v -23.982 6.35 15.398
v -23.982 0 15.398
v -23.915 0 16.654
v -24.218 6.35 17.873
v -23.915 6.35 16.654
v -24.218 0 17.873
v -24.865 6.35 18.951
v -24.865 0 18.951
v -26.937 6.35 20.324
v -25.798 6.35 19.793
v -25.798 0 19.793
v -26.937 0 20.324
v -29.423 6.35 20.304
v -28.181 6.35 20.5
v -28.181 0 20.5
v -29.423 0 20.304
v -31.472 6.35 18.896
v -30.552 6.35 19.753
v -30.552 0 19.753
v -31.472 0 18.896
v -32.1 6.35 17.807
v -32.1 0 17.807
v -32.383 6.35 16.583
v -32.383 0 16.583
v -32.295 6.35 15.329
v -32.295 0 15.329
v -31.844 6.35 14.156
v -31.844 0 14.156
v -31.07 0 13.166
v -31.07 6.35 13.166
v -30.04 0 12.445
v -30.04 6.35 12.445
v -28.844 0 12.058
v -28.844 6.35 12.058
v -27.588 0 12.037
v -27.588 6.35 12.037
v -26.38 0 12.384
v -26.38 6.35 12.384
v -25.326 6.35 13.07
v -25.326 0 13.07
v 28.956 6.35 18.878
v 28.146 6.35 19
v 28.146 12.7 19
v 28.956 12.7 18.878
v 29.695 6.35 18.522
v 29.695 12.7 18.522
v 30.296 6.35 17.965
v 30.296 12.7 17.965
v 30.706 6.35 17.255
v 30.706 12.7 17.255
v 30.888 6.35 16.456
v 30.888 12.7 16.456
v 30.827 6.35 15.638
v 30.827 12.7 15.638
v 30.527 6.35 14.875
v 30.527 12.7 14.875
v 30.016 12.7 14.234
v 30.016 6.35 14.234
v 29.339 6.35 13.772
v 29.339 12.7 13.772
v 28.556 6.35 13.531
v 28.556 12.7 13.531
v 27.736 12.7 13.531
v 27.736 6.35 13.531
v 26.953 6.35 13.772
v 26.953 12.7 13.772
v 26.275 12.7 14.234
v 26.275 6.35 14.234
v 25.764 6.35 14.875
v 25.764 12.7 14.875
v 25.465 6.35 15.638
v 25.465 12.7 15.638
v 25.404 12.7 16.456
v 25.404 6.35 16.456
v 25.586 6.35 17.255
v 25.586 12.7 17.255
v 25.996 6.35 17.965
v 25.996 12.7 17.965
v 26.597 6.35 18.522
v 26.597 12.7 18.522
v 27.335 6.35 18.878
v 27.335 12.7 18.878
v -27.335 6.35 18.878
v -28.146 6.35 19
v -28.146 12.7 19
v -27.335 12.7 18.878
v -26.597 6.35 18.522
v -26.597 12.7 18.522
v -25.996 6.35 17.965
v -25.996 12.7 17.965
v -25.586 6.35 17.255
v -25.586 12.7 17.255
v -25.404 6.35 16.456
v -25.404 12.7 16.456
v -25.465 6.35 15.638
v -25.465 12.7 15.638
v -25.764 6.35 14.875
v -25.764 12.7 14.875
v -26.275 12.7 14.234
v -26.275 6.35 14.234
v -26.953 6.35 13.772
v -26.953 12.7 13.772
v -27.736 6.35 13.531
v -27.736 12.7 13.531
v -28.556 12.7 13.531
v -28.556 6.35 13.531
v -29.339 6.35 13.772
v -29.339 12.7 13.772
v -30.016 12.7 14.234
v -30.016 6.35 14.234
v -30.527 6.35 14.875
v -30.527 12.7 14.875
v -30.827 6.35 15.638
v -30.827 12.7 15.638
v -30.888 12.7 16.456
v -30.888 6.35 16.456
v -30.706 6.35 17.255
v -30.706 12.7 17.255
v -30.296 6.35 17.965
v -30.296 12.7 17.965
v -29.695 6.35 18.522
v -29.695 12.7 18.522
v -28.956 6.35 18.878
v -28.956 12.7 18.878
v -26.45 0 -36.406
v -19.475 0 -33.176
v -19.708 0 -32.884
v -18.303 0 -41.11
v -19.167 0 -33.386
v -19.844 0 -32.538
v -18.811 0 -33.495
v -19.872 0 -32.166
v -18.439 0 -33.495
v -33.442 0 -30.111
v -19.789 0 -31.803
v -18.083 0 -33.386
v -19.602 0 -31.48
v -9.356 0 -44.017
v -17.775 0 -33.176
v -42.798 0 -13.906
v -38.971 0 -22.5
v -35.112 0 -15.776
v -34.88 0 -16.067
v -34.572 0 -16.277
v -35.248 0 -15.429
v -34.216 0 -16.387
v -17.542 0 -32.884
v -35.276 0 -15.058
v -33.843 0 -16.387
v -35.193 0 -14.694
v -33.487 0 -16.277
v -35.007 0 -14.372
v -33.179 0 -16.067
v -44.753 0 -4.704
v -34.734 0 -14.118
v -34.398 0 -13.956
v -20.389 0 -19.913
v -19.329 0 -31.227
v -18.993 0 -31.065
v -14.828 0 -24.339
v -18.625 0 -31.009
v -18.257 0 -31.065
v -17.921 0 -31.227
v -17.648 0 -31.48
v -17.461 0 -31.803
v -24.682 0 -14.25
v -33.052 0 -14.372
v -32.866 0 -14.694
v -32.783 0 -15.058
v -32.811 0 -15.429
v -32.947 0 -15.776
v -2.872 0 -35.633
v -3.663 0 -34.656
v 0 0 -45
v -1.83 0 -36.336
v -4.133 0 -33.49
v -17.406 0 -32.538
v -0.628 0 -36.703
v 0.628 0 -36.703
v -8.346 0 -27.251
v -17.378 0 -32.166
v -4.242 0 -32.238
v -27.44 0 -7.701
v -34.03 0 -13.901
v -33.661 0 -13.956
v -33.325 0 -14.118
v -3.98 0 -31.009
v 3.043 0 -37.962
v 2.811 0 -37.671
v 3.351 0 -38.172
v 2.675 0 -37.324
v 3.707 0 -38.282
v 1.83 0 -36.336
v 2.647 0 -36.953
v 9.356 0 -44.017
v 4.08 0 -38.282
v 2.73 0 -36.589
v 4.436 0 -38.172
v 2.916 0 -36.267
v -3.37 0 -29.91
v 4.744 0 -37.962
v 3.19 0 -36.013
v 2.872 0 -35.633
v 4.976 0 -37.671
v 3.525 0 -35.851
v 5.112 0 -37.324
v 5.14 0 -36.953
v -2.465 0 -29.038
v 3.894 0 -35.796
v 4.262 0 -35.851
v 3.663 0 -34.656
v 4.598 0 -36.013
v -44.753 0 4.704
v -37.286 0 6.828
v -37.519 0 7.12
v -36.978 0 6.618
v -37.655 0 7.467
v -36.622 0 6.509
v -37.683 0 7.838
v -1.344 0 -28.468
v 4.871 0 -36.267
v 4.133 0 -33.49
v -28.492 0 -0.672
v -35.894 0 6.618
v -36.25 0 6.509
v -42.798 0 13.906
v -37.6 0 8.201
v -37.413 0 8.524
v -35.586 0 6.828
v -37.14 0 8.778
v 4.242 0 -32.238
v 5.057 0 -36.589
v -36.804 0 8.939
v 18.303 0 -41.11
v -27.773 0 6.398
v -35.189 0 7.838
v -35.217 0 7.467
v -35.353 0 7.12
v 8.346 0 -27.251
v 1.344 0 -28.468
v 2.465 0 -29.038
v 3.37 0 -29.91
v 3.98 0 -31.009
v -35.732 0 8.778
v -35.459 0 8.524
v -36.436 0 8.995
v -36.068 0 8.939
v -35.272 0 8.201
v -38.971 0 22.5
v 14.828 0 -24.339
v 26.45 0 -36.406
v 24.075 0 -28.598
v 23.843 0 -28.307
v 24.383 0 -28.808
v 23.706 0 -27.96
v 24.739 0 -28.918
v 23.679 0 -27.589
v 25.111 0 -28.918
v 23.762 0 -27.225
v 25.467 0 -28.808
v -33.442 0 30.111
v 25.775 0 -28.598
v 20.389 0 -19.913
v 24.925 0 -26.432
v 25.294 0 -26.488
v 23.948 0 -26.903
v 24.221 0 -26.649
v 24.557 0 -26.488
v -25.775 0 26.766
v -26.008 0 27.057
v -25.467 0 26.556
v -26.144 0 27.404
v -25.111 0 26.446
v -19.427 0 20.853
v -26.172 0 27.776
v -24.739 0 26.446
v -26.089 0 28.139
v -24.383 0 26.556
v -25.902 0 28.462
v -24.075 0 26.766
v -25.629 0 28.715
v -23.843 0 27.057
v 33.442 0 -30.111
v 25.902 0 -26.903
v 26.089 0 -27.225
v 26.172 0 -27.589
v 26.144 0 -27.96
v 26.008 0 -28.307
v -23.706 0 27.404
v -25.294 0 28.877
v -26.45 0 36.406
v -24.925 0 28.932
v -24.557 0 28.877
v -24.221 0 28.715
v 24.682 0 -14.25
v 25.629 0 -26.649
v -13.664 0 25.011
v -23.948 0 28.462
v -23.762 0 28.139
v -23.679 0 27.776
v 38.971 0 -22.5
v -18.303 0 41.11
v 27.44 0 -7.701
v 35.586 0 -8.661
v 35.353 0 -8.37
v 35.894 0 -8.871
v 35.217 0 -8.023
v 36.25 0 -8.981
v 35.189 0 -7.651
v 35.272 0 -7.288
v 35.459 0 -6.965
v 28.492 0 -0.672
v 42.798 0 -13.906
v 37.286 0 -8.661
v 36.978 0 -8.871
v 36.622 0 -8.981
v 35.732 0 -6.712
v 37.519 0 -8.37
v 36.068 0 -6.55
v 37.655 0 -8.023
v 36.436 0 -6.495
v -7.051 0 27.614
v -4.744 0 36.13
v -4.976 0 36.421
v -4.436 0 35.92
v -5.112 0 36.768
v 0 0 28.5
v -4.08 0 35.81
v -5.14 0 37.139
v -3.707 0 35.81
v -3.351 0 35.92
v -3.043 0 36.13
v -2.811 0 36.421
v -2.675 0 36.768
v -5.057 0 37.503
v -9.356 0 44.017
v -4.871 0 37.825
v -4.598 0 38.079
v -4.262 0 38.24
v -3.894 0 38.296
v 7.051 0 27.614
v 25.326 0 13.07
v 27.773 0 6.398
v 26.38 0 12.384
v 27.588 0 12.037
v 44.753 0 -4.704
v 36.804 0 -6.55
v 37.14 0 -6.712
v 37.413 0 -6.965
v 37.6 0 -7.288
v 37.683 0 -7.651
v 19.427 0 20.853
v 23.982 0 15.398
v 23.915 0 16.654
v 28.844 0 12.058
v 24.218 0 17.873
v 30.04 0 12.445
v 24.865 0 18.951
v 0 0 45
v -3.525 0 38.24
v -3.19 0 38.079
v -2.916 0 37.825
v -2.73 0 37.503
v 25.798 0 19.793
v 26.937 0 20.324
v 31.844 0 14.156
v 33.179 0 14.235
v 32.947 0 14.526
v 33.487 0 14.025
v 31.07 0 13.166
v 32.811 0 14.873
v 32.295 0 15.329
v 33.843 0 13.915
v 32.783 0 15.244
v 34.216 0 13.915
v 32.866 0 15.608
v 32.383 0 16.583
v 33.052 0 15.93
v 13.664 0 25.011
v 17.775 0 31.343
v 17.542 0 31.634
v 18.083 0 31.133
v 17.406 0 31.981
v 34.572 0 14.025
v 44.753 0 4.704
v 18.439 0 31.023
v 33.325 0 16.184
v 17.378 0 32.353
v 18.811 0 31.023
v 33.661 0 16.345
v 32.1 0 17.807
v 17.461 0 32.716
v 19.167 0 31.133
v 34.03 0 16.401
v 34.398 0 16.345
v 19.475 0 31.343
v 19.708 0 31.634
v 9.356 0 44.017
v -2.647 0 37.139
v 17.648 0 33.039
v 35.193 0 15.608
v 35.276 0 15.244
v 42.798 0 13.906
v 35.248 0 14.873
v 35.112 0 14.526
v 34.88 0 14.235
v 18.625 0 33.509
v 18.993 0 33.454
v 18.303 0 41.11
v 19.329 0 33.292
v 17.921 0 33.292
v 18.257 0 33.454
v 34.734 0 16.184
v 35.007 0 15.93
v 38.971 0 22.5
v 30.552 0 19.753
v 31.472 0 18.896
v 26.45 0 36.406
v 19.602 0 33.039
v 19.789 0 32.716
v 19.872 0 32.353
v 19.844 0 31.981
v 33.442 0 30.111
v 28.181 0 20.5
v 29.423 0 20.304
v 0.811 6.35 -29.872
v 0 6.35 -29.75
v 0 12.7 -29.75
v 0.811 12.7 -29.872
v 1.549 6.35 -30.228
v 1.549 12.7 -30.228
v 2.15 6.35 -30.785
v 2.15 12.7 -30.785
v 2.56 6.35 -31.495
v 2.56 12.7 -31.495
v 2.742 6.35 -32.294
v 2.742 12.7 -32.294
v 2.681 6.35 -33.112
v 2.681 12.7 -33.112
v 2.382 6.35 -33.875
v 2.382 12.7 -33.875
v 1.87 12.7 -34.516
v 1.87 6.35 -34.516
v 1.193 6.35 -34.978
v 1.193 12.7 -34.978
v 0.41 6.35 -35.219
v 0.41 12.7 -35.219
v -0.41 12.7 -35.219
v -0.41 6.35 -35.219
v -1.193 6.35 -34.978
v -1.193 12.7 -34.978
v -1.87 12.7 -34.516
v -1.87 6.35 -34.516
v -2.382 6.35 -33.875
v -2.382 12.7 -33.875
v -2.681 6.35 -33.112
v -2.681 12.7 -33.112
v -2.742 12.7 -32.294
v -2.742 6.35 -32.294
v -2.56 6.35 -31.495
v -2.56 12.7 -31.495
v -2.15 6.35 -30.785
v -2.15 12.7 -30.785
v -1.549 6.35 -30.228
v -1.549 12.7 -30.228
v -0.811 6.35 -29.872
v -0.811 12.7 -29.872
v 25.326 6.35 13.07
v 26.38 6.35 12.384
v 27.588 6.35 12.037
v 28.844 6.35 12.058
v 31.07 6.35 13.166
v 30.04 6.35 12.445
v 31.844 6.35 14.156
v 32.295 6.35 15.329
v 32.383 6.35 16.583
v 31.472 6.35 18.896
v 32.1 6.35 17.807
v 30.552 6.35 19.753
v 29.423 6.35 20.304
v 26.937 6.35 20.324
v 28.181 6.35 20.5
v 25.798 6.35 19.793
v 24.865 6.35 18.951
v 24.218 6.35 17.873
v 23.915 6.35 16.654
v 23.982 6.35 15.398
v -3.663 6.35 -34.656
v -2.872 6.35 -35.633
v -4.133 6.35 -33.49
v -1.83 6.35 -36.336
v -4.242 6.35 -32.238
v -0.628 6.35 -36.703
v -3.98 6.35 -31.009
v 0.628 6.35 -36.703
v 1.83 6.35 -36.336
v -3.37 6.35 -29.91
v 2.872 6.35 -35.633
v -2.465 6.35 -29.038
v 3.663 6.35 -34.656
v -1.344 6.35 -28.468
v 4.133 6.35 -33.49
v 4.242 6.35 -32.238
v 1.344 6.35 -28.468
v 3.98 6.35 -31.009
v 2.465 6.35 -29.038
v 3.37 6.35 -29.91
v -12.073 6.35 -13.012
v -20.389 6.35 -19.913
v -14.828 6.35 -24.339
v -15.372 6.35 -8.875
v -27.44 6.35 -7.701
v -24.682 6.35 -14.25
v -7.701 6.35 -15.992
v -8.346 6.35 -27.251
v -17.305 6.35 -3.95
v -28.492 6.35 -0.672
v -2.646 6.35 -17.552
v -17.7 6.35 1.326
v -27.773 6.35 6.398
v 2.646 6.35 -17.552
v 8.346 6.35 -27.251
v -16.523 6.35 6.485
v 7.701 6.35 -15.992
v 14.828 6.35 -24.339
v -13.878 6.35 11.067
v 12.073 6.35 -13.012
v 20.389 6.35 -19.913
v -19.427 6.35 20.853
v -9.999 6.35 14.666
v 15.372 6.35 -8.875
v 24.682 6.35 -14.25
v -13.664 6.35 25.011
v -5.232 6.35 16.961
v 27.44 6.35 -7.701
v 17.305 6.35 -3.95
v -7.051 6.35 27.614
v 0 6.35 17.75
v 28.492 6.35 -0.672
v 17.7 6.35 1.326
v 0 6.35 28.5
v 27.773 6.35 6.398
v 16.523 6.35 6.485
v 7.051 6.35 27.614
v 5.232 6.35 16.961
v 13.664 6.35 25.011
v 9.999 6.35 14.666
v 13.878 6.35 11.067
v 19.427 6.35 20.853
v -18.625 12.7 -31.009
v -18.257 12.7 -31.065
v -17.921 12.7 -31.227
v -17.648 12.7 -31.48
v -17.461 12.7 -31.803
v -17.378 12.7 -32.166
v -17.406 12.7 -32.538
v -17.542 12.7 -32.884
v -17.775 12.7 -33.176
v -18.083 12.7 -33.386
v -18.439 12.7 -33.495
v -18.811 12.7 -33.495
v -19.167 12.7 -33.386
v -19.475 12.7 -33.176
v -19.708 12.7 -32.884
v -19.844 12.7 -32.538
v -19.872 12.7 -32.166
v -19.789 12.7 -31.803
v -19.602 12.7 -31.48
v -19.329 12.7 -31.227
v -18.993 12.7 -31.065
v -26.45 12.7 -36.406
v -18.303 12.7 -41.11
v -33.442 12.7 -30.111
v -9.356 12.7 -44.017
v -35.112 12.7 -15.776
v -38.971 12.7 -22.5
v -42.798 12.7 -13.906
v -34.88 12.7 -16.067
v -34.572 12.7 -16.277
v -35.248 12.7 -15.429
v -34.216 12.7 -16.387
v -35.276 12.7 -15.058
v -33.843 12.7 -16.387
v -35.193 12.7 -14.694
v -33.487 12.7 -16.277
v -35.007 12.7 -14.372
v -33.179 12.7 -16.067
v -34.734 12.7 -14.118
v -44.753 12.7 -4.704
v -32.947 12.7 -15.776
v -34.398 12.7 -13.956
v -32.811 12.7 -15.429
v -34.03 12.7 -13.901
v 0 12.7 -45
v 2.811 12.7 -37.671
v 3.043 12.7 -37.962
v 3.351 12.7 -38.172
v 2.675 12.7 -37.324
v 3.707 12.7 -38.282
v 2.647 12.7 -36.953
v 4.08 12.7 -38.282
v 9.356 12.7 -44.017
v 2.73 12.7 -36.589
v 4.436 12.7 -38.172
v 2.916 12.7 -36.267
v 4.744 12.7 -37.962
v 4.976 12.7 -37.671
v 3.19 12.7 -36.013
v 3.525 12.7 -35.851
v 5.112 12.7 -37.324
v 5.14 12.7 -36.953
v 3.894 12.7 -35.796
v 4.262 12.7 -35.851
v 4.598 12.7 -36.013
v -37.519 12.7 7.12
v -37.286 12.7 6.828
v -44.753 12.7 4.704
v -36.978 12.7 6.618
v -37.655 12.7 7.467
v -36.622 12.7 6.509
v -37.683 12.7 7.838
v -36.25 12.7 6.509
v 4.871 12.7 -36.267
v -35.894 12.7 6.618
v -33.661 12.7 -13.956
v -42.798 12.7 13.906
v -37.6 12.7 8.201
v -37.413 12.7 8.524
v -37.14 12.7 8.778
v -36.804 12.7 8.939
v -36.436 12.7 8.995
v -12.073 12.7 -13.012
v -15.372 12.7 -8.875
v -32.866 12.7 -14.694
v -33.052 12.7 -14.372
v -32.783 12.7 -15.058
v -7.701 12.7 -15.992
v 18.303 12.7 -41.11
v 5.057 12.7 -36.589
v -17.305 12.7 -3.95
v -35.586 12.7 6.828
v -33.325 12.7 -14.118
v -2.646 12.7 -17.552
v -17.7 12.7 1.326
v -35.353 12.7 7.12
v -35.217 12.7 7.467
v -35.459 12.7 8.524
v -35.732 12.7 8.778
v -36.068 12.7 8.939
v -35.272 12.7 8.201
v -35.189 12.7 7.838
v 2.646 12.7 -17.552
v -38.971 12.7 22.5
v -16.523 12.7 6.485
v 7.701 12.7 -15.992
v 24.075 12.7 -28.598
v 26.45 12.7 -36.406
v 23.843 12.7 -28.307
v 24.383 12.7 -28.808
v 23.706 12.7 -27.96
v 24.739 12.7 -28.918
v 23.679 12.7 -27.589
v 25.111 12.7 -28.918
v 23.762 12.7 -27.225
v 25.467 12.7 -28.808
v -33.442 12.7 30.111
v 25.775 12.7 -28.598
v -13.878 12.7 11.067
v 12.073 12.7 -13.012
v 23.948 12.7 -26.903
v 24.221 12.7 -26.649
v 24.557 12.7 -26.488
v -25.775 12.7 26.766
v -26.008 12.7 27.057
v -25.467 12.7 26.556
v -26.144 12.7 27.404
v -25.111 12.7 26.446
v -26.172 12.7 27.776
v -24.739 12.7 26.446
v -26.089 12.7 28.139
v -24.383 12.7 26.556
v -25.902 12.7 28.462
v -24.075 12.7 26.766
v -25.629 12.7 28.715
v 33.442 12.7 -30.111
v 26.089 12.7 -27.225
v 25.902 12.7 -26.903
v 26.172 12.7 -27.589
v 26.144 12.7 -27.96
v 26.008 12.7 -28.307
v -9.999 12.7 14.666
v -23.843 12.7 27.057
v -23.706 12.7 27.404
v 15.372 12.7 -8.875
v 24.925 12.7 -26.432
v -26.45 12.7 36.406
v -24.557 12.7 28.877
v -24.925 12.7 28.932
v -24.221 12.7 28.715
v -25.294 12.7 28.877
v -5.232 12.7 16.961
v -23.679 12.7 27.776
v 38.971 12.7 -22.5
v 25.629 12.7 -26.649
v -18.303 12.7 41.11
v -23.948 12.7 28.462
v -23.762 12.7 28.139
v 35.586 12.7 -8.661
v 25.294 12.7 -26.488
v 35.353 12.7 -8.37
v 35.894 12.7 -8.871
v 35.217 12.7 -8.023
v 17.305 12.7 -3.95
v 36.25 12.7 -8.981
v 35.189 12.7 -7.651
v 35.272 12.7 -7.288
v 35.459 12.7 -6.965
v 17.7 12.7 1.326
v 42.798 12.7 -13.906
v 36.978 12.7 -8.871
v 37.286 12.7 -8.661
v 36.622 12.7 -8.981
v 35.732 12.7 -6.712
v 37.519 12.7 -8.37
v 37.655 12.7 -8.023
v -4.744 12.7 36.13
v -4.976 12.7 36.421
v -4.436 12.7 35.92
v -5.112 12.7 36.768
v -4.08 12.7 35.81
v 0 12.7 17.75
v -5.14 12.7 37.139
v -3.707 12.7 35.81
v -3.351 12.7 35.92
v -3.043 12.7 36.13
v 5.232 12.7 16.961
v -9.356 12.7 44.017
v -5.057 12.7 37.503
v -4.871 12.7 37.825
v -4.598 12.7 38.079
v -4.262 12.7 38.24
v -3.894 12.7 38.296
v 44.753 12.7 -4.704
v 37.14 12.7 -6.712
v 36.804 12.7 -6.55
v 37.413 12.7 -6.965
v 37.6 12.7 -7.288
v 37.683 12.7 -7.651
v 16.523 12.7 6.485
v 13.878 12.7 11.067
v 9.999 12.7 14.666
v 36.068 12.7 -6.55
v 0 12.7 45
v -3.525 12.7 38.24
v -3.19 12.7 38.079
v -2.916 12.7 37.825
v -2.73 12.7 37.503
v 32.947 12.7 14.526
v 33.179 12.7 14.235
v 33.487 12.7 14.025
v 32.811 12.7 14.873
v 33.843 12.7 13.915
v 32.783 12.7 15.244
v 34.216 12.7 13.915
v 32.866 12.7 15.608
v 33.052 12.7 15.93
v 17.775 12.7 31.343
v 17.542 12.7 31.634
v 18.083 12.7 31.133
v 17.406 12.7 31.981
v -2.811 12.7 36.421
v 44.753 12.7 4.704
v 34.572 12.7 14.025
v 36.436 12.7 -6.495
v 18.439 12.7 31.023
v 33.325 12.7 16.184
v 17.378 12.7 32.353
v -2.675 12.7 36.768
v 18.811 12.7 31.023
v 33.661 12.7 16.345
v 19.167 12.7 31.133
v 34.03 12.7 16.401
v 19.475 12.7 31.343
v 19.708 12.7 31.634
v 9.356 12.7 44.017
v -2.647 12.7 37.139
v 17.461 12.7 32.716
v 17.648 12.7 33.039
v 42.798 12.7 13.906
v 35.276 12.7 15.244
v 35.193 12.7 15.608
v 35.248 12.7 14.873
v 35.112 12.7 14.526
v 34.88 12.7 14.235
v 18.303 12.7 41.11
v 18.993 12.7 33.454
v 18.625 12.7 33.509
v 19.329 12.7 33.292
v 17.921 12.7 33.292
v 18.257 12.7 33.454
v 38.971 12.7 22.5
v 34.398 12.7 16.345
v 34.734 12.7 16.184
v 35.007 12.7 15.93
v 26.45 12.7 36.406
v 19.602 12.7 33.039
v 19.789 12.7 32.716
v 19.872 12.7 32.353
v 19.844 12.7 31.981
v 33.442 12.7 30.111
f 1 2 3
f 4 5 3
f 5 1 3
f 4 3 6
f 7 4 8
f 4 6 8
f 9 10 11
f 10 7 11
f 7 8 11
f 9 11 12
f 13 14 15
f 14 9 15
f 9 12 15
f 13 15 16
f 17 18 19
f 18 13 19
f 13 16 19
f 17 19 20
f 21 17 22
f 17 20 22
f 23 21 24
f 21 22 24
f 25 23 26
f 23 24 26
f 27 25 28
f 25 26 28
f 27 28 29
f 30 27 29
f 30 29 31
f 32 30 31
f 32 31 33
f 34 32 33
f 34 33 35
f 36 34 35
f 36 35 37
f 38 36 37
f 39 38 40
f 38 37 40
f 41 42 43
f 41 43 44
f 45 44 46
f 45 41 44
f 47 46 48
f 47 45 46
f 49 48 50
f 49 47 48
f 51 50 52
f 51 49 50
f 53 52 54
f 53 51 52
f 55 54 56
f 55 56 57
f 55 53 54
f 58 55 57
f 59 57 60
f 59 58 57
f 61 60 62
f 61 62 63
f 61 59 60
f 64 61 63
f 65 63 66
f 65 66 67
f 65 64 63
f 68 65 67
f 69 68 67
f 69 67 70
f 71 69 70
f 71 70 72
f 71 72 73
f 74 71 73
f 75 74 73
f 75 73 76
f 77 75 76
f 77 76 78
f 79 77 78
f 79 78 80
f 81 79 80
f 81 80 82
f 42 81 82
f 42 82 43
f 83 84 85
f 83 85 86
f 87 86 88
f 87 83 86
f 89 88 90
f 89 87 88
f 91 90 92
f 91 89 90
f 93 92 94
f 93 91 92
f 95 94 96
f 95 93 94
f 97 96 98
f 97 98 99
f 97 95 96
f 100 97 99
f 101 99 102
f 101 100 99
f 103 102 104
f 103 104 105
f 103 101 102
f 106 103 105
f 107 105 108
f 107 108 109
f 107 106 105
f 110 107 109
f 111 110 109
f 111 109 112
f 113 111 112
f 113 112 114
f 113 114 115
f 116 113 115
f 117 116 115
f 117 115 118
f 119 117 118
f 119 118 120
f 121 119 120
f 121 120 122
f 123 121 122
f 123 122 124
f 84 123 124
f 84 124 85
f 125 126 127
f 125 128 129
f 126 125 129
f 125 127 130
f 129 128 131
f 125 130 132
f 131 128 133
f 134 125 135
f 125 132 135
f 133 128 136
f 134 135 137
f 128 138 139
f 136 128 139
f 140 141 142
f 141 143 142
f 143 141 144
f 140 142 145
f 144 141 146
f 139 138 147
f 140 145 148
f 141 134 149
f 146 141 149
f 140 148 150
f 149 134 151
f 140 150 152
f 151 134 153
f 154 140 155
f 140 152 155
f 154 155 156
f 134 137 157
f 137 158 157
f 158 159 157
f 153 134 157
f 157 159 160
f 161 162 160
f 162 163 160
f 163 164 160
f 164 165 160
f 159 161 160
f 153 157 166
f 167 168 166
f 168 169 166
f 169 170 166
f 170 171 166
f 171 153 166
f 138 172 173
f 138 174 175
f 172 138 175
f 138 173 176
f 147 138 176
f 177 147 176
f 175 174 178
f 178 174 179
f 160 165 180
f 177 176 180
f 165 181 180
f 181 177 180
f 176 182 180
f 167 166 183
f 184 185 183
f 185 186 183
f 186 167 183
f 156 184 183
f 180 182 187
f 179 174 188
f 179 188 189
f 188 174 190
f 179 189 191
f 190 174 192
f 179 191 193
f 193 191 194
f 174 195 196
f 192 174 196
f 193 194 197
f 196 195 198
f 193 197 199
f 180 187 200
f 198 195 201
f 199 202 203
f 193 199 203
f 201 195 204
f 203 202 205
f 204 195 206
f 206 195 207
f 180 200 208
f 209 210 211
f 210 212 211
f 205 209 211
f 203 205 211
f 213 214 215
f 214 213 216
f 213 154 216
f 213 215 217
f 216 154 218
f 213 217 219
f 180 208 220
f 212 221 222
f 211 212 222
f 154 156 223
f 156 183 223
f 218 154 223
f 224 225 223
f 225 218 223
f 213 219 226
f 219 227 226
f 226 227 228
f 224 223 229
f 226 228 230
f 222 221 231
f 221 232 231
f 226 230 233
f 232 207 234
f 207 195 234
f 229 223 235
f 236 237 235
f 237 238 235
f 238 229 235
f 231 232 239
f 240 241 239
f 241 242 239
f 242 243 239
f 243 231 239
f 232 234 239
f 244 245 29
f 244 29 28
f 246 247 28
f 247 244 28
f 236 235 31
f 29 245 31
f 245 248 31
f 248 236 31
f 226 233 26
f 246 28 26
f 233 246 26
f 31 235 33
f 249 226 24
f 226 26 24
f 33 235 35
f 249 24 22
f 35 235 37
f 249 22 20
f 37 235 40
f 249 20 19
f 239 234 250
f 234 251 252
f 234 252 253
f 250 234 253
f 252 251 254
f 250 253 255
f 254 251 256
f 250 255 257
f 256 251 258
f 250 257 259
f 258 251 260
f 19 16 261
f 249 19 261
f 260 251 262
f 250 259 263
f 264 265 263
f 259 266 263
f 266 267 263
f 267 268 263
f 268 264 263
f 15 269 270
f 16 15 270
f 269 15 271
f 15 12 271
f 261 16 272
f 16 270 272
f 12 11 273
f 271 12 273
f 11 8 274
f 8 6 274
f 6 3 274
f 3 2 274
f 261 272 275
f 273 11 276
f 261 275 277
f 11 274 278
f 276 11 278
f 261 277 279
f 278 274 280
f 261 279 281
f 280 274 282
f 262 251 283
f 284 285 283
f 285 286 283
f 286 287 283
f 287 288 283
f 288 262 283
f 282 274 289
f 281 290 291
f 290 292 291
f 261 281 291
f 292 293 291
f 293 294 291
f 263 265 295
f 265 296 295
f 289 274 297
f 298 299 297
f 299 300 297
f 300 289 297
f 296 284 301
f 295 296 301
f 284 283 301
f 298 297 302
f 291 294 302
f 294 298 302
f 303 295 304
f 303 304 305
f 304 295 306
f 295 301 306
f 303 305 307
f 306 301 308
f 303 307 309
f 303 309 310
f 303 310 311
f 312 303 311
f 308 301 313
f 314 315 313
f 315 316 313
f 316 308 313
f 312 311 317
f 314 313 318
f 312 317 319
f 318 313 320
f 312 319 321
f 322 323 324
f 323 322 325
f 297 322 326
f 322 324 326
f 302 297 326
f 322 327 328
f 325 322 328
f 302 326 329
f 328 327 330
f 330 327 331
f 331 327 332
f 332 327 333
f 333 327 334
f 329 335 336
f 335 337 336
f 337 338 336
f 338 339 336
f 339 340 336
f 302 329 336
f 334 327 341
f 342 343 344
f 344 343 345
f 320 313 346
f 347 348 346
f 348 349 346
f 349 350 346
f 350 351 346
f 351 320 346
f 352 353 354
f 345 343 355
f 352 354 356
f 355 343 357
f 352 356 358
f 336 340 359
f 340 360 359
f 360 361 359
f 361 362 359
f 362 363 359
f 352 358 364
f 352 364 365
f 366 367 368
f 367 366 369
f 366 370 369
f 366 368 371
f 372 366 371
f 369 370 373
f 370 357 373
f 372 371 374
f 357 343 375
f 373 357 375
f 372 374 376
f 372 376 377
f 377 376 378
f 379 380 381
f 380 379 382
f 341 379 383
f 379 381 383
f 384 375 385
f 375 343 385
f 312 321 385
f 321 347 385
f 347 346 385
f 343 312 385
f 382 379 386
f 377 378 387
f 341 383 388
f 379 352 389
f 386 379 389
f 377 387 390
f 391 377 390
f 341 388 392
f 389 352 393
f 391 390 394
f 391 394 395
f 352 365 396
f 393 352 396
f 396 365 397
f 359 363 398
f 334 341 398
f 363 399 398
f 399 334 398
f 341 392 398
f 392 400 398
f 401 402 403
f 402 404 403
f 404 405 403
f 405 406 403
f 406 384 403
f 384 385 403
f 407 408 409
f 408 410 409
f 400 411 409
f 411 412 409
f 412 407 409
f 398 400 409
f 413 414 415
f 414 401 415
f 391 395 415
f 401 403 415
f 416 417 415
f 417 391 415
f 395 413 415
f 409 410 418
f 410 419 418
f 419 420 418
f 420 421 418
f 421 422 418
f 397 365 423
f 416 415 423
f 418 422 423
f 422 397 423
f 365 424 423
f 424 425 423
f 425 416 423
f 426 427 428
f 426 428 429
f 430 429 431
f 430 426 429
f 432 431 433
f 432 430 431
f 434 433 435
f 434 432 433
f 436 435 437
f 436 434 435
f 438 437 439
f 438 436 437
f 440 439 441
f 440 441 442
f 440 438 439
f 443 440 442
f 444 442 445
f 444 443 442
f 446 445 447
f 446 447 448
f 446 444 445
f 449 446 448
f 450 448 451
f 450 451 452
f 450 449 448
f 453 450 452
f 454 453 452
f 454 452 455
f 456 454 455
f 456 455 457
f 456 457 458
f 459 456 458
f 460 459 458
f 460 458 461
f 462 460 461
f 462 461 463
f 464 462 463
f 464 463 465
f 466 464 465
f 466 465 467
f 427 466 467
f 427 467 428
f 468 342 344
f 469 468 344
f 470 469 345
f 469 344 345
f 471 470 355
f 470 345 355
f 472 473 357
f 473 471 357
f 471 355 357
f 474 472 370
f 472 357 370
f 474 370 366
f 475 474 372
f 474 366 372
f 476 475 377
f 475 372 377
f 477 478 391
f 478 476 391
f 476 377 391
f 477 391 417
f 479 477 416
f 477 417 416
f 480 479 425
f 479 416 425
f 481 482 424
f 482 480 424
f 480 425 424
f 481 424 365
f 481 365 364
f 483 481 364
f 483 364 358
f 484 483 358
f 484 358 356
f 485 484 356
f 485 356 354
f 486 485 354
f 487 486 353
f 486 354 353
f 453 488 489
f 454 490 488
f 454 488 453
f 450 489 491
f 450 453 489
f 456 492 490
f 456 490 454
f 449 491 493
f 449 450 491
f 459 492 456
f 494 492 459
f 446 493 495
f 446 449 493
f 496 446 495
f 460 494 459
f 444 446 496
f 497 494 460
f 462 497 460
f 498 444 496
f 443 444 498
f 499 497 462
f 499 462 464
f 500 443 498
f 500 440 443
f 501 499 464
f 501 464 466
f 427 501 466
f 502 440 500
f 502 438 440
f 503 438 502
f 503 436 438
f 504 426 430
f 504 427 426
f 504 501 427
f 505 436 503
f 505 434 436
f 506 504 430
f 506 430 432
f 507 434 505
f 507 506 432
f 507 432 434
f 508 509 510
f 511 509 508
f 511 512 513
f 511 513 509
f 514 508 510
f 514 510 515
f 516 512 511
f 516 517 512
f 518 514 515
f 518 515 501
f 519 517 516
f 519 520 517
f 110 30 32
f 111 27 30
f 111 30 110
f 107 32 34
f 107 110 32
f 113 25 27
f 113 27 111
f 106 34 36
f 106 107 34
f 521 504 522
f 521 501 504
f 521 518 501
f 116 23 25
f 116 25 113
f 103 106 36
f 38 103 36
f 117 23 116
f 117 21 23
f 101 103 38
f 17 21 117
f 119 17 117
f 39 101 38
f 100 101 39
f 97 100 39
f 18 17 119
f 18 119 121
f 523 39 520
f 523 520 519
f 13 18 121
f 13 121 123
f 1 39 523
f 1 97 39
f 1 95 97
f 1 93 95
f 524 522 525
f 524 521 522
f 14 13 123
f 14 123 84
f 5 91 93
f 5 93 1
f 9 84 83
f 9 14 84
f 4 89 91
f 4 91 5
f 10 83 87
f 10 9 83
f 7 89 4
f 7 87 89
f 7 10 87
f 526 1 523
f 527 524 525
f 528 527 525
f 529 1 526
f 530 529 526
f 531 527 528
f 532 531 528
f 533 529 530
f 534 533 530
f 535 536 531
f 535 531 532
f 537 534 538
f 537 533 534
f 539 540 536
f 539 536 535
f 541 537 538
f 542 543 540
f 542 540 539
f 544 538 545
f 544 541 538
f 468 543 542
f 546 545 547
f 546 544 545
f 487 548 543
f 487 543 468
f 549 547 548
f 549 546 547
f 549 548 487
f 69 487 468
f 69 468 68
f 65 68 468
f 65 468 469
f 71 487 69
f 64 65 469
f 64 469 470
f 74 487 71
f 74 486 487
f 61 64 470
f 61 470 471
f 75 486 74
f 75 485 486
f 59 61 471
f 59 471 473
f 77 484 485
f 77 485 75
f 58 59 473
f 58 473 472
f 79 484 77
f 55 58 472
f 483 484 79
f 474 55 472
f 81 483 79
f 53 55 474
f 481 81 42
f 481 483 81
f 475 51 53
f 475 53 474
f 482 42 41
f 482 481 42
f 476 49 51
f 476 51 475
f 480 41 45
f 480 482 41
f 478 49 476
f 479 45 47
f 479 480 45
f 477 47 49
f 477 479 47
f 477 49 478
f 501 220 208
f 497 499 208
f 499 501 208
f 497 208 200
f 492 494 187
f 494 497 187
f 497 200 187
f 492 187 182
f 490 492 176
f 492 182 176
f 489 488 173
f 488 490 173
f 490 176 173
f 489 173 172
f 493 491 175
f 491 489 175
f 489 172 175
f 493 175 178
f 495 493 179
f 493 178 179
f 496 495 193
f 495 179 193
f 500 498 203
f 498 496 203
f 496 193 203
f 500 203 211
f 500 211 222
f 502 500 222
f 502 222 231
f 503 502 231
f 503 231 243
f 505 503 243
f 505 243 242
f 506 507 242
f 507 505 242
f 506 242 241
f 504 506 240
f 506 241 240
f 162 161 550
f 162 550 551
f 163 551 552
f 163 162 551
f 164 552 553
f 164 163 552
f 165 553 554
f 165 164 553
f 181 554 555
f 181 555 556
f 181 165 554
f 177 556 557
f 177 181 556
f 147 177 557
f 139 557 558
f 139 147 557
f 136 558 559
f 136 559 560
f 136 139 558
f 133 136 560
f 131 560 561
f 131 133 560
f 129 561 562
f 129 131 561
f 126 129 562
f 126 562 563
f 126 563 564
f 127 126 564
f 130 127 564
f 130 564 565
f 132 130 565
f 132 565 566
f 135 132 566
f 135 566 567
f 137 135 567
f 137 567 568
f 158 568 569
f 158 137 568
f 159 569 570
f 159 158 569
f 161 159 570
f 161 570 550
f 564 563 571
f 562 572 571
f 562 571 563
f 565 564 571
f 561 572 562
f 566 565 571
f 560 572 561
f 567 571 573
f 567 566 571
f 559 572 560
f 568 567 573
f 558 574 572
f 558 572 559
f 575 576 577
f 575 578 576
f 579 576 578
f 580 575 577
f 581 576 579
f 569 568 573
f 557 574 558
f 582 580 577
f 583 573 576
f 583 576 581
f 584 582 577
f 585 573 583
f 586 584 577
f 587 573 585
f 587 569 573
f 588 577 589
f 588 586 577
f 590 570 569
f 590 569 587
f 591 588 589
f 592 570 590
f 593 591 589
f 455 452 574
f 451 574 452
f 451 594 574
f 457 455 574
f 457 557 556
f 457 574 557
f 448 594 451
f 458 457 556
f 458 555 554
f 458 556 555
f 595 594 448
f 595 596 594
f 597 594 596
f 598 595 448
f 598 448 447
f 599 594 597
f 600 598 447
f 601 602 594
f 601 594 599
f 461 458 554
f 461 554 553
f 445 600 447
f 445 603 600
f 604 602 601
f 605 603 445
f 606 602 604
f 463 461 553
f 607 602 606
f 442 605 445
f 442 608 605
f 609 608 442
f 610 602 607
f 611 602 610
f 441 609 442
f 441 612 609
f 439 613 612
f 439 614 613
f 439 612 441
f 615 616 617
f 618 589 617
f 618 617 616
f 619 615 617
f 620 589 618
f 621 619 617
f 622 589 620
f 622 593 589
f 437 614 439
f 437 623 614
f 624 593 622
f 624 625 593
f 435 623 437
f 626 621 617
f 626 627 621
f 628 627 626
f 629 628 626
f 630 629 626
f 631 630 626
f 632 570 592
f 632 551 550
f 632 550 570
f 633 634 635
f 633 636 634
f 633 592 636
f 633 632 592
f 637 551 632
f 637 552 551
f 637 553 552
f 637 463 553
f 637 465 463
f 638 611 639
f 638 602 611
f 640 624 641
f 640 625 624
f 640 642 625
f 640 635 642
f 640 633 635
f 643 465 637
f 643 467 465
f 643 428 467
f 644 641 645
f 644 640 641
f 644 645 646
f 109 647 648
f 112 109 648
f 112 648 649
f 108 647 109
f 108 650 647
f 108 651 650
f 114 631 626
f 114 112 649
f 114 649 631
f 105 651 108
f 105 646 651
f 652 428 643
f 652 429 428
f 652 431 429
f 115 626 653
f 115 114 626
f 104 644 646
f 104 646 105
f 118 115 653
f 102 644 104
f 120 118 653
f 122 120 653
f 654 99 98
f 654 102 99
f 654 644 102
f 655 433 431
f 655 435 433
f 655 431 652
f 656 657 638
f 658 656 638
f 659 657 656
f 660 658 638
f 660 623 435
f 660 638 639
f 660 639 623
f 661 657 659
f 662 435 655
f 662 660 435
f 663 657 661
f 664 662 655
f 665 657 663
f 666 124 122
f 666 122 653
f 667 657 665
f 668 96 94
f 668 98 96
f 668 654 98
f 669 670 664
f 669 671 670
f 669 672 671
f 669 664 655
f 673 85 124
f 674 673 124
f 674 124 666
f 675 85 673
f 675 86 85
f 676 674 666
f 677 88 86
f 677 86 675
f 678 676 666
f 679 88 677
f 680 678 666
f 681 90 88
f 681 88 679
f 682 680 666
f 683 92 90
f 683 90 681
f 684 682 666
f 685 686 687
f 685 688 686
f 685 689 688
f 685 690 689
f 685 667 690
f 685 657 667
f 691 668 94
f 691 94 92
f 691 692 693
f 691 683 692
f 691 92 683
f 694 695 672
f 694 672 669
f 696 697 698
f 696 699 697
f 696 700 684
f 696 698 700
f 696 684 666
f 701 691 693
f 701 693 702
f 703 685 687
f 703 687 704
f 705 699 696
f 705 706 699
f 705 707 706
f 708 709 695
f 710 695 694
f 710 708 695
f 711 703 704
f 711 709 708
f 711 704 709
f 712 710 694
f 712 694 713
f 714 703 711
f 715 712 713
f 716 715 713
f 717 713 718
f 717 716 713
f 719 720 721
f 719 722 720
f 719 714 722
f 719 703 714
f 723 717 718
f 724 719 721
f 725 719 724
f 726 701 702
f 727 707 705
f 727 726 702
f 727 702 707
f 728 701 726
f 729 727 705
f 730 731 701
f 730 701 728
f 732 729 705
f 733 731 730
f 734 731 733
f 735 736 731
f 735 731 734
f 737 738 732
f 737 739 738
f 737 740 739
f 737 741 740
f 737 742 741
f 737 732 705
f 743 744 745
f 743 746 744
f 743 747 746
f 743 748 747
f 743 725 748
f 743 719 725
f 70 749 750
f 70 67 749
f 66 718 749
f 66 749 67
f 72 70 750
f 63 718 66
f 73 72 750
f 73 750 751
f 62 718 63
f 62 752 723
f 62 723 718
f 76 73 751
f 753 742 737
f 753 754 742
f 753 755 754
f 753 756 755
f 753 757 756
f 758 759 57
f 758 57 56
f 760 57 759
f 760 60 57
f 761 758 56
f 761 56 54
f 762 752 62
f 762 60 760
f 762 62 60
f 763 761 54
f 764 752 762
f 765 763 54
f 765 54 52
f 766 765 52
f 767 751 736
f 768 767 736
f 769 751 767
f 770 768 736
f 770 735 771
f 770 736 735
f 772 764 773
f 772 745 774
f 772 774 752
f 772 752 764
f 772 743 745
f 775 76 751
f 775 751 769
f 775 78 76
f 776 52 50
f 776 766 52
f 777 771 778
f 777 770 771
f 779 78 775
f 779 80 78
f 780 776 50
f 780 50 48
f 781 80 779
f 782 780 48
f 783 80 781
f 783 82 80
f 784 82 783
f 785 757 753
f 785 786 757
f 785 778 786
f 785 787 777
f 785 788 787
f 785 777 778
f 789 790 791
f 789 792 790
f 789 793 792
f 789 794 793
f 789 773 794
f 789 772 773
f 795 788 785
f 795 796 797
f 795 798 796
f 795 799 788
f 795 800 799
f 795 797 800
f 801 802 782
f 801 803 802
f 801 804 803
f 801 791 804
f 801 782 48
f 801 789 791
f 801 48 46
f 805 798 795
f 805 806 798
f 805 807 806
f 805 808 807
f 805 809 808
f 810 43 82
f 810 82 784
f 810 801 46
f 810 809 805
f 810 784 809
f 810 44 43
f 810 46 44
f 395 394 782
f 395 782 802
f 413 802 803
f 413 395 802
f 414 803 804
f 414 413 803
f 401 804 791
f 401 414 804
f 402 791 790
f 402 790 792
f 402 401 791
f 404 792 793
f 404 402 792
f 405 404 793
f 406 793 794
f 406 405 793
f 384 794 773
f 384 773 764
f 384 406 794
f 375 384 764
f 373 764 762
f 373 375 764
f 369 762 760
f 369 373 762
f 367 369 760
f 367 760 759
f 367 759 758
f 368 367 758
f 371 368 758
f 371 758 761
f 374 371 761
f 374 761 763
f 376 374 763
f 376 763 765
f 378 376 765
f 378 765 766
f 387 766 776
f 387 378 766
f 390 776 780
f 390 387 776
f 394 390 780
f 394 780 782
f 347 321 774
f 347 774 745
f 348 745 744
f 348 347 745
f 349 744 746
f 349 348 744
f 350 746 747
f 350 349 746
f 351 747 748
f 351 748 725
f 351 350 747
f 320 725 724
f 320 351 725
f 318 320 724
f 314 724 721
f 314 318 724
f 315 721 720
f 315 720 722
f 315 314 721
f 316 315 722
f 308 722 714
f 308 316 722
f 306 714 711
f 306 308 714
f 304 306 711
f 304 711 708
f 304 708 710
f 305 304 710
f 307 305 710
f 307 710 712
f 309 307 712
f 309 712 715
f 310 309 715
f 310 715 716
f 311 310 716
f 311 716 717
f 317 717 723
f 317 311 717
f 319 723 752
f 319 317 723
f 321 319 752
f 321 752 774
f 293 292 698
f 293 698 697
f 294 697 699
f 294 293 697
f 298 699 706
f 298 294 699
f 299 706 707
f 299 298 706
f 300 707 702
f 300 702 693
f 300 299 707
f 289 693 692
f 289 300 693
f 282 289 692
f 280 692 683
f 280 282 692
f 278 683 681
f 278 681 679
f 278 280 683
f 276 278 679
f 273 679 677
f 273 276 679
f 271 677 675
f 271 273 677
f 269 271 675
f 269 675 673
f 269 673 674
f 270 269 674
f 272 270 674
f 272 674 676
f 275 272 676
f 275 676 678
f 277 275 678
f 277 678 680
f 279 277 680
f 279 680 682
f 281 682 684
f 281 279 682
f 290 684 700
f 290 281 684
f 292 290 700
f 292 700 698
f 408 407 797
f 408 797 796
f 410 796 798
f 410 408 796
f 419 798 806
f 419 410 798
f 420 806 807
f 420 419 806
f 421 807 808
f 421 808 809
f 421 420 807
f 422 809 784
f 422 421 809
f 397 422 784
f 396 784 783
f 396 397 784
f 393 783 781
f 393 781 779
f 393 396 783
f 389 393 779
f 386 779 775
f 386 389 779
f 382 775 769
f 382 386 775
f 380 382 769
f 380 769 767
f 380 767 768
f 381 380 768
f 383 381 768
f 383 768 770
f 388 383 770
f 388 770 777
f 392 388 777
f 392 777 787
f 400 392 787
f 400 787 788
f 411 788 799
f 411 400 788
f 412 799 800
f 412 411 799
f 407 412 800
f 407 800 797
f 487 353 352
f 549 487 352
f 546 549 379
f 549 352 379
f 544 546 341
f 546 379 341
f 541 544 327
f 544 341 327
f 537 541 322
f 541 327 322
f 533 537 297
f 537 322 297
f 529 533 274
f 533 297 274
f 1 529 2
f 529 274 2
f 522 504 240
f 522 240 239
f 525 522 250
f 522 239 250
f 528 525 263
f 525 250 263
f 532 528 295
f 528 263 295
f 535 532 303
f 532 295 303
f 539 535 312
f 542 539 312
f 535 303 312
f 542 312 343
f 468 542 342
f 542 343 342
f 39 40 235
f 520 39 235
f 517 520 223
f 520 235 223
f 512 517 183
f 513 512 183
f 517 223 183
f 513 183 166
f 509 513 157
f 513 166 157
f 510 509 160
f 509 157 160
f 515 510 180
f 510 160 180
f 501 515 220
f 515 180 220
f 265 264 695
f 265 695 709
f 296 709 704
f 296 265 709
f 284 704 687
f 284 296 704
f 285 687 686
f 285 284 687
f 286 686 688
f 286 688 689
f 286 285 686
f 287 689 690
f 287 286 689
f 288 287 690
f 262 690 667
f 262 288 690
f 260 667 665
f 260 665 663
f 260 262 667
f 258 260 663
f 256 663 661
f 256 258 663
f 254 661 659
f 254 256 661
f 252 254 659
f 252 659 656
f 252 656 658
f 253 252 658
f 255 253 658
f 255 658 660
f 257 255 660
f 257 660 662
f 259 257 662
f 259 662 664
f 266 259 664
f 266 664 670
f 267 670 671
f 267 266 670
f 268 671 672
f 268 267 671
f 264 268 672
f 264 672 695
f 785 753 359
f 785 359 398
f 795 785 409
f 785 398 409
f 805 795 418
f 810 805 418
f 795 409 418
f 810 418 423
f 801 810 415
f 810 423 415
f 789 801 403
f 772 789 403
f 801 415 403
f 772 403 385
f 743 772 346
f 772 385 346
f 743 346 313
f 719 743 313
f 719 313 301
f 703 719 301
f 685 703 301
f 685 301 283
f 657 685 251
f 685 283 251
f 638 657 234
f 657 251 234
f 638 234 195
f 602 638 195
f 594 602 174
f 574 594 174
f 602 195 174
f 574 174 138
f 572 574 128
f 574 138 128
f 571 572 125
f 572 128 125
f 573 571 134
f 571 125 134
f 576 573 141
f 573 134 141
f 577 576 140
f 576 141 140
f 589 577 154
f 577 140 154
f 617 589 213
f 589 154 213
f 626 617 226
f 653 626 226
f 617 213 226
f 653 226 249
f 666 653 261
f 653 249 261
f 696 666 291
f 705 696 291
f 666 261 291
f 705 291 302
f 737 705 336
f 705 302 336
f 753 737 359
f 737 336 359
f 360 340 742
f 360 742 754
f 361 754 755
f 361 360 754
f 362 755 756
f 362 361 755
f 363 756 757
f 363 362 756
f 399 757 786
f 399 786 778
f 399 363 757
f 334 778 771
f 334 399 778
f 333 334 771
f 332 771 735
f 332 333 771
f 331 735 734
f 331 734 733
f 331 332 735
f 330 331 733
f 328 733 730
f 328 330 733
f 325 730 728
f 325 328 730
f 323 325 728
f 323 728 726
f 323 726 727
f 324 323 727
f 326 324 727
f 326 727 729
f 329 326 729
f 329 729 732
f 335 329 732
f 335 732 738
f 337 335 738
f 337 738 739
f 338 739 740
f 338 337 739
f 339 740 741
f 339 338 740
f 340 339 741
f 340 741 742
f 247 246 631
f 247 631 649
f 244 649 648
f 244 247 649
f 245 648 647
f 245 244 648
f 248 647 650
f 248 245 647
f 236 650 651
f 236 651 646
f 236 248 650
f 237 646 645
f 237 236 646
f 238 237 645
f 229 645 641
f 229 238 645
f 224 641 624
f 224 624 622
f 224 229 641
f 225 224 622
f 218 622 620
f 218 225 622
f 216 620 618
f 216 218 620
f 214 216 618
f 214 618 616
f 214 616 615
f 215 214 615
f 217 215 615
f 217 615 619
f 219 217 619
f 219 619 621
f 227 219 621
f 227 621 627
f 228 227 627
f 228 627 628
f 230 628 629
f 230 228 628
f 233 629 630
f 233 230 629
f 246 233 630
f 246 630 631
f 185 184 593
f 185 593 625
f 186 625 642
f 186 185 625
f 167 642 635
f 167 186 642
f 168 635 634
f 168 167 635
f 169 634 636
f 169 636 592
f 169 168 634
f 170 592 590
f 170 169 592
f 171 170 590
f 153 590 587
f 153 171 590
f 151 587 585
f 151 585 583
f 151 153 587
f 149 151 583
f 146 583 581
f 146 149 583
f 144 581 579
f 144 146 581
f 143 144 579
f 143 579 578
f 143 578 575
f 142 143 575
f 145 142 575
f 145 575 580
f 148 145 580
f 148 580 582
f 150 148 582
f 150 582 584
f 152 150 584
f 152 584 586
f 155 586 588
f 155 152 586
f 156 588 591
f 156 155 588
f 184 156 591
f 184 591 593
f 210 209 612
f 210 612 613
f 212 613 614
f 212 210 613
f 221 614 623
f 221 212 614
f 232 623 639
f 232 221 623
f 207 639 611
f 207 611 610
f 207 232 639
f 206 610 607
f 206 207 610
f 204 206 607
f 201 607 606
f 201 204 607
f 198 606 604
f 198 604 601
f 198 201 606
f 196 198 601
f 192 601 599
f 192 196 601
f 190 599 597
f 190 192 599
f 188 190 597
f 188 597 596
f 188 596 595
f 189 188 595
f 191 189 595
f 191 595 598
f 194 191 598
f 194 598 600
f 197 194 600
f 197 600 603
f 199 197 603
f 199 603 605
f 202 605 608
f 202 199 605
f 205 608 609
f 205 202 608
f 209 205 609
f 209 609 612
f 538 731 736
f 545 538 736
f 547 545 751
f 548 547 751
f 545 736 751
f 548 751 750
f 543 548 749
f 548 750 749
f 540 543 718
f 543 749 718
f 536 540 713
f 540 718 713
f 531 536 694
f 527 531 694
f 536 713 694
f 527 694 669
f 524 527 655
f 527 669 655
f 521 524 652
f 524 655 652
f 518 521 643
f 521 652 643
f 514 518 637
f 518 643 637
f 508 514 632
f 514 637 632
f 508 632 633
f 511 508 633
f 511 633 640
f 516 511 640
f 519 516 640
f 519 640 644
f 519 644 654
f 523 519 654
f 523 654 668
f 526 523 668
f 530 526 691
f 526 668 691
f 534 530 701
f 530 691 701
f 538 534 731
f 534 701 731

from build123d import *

# Parameters (mm, degrees)
SKETCH1_R           = 45
SKETCH1_R_2         = 2.75
SKETCH1_R_3         = 1.25
BOSS_EXTRUDE1_DEPTH = 12.7
SKETCH2_R           = 17.75
CUT_EXTRUDE1_DEPTH  = 6.35
SKETCH3_R           = 6
CUT_EXTRUDE2_DEPTH  = 64.95562915
SKETCH4_R           = 28.5
CUT_EXTRUDE3_DEPTH  = 6.35
SKETCH6_R           = 4.25
CUT_EXTRUDE4_DEPTH  = 6.35


with BuildPart() as part:
    # Sketch1 → Boss-Extrude1 (new body)
    with BuildSketch(Plane(origin=(0, 0, 0), x_dir=(1, 0, 0), z_dir=(0, 1, 0))):
        with Locations(Location((0, 0, 0), (0, 0, 270))):
            Circle(SKETCH1_R)
        with Locations(Location((0, 32.5, 0), (0, 0, 270))):
            Circle(SKETCH1_R_2, mode=Mode.SUBTRACT)
        with Locations(Location((28.145825623, -16.25, 0), (0, 0, 270))):
            Circle(SKETCH1_R_2, mode=Mode.SUBTRACT)
        with Locations(Location((-28.145825623, -16.25, 0), (0, 0, 270))):
            Circle(SKETCH1_R_2, mode=Mode.SUBTRACT)
        with Locations(Location((-36.435998127, -7.744710483, 0), (0, 0, 270))):
            Circle(SKETCH1_R_3, mode=Mode.SUBTRACT)
        with Locations(Location((-34.029568297, 15.150939955, 0), (0, 0, 270))):
            Circle(SKETCH1_R_3, mode=Mode.SUBTRACT)
        with Locations(Location((-18.625, 32.259446291, 0), (0, 0, 270))):
            Circle(SKETCH1_R_3, mode=Mode.SUBTRACT)
        with Locations(Location((3.893685257, 37.045940602, 0), (0, 0, 270))):
            Circle(SKETCH1_R_3, mode=Mode.SUBTRACT)
        with Locations(Location((24.925115087, 27.682144749, 0), (0, 0, 270))):
            Circle(SKETCH1_R_3, mode=Mode.SUBTRACT)
        with Locations(Location((36.435998127, 7.744710483, 0), (0, 0, 270))):
            Circle(SKETCH1_R_3, mode=Mode.SUBTRACT)
        with Locations(Location((34.029568297, -15.150939955, 0), (0, 0, 270))):
            Circle(SKETCH1_R_3, mode=Mode.SUBTRACT)
        with Locations(Location((18.625, -32.259446291, 0), (0, 0, 270))):
            Circle(SKETCH1_R_3, mode=Mode.SUBTRACT)
        with Locations(Location((-3.893685257, -37.045940602, 0), (0, 0, 270))):
            Circle(SKETCH1_R_3, mode=Mode.SUBTRACT)
        with Locations(Location((-24.925115087, -27.682144749, 0), (0, 0, 270))):
            Circle(SKETCH1_R_3, mode=Mode.SUBTRACT)
    extrude(amount=BOSS_EXTRUDE1_DEPTH)

    # Sketch2 → Cut-Extrude1 (cut)
    with BuildSketch(Plane(origin=(0, 12.7, 0), x_dir=(1, 0, 0), z_dir=(0, 1, 0))):
        with Locations(Location((0, 0, 0), (0, 0, 270))):
            Circle(SKETCH2_R)
    extrude(amount=-CUT_EXTRUDE1_DEPTH, mode=Mode.SUBTRACT)

    # Sketch3 → Cut-Extrude2 (cut, through all)
    with BuildSketch(Plane(origin=(0, 6.35, 0), x_dir=(1, 0, 0), z_dir=(0, 1, 0))):
        with Locations(Location((0, 0, 0), (0, 0, 270))):
            Circle(SKETCH3_R)
    extrude(amount=-CUT_EXTRUDE2_DEPTH, mode=Mode.SUBTRACT)

    # Sketch4 → Cut-Extrude3 (cut)
    with BuildSketch(Plane.XZ):
        with Locations(Location((0, 0, 0), (0, 0, 270))):
            Circle(SKETCH4_R)
    extrude(amount=-CUT_EXTRUDE3_DEPTH, mode=Mode.SUBTRACT)

    # Sketch6 → Cut-Extrude4 (cut)
    with BuildSketch(Plane.XZ):
        with Locations((28.145825623, 16.25)):
            Circle(SKETCH6_R)
        with Locations((0, -32.5)):
            Circle(SKETCH6_R)
        with Locations((-28.145825623, 16.25)):
            Circle(SKETCH6_R)
    extrude(amount=-CUT_EXTRUDE4_DEPTH, mode=Mode.SUBTRACT)


solid = part.part
